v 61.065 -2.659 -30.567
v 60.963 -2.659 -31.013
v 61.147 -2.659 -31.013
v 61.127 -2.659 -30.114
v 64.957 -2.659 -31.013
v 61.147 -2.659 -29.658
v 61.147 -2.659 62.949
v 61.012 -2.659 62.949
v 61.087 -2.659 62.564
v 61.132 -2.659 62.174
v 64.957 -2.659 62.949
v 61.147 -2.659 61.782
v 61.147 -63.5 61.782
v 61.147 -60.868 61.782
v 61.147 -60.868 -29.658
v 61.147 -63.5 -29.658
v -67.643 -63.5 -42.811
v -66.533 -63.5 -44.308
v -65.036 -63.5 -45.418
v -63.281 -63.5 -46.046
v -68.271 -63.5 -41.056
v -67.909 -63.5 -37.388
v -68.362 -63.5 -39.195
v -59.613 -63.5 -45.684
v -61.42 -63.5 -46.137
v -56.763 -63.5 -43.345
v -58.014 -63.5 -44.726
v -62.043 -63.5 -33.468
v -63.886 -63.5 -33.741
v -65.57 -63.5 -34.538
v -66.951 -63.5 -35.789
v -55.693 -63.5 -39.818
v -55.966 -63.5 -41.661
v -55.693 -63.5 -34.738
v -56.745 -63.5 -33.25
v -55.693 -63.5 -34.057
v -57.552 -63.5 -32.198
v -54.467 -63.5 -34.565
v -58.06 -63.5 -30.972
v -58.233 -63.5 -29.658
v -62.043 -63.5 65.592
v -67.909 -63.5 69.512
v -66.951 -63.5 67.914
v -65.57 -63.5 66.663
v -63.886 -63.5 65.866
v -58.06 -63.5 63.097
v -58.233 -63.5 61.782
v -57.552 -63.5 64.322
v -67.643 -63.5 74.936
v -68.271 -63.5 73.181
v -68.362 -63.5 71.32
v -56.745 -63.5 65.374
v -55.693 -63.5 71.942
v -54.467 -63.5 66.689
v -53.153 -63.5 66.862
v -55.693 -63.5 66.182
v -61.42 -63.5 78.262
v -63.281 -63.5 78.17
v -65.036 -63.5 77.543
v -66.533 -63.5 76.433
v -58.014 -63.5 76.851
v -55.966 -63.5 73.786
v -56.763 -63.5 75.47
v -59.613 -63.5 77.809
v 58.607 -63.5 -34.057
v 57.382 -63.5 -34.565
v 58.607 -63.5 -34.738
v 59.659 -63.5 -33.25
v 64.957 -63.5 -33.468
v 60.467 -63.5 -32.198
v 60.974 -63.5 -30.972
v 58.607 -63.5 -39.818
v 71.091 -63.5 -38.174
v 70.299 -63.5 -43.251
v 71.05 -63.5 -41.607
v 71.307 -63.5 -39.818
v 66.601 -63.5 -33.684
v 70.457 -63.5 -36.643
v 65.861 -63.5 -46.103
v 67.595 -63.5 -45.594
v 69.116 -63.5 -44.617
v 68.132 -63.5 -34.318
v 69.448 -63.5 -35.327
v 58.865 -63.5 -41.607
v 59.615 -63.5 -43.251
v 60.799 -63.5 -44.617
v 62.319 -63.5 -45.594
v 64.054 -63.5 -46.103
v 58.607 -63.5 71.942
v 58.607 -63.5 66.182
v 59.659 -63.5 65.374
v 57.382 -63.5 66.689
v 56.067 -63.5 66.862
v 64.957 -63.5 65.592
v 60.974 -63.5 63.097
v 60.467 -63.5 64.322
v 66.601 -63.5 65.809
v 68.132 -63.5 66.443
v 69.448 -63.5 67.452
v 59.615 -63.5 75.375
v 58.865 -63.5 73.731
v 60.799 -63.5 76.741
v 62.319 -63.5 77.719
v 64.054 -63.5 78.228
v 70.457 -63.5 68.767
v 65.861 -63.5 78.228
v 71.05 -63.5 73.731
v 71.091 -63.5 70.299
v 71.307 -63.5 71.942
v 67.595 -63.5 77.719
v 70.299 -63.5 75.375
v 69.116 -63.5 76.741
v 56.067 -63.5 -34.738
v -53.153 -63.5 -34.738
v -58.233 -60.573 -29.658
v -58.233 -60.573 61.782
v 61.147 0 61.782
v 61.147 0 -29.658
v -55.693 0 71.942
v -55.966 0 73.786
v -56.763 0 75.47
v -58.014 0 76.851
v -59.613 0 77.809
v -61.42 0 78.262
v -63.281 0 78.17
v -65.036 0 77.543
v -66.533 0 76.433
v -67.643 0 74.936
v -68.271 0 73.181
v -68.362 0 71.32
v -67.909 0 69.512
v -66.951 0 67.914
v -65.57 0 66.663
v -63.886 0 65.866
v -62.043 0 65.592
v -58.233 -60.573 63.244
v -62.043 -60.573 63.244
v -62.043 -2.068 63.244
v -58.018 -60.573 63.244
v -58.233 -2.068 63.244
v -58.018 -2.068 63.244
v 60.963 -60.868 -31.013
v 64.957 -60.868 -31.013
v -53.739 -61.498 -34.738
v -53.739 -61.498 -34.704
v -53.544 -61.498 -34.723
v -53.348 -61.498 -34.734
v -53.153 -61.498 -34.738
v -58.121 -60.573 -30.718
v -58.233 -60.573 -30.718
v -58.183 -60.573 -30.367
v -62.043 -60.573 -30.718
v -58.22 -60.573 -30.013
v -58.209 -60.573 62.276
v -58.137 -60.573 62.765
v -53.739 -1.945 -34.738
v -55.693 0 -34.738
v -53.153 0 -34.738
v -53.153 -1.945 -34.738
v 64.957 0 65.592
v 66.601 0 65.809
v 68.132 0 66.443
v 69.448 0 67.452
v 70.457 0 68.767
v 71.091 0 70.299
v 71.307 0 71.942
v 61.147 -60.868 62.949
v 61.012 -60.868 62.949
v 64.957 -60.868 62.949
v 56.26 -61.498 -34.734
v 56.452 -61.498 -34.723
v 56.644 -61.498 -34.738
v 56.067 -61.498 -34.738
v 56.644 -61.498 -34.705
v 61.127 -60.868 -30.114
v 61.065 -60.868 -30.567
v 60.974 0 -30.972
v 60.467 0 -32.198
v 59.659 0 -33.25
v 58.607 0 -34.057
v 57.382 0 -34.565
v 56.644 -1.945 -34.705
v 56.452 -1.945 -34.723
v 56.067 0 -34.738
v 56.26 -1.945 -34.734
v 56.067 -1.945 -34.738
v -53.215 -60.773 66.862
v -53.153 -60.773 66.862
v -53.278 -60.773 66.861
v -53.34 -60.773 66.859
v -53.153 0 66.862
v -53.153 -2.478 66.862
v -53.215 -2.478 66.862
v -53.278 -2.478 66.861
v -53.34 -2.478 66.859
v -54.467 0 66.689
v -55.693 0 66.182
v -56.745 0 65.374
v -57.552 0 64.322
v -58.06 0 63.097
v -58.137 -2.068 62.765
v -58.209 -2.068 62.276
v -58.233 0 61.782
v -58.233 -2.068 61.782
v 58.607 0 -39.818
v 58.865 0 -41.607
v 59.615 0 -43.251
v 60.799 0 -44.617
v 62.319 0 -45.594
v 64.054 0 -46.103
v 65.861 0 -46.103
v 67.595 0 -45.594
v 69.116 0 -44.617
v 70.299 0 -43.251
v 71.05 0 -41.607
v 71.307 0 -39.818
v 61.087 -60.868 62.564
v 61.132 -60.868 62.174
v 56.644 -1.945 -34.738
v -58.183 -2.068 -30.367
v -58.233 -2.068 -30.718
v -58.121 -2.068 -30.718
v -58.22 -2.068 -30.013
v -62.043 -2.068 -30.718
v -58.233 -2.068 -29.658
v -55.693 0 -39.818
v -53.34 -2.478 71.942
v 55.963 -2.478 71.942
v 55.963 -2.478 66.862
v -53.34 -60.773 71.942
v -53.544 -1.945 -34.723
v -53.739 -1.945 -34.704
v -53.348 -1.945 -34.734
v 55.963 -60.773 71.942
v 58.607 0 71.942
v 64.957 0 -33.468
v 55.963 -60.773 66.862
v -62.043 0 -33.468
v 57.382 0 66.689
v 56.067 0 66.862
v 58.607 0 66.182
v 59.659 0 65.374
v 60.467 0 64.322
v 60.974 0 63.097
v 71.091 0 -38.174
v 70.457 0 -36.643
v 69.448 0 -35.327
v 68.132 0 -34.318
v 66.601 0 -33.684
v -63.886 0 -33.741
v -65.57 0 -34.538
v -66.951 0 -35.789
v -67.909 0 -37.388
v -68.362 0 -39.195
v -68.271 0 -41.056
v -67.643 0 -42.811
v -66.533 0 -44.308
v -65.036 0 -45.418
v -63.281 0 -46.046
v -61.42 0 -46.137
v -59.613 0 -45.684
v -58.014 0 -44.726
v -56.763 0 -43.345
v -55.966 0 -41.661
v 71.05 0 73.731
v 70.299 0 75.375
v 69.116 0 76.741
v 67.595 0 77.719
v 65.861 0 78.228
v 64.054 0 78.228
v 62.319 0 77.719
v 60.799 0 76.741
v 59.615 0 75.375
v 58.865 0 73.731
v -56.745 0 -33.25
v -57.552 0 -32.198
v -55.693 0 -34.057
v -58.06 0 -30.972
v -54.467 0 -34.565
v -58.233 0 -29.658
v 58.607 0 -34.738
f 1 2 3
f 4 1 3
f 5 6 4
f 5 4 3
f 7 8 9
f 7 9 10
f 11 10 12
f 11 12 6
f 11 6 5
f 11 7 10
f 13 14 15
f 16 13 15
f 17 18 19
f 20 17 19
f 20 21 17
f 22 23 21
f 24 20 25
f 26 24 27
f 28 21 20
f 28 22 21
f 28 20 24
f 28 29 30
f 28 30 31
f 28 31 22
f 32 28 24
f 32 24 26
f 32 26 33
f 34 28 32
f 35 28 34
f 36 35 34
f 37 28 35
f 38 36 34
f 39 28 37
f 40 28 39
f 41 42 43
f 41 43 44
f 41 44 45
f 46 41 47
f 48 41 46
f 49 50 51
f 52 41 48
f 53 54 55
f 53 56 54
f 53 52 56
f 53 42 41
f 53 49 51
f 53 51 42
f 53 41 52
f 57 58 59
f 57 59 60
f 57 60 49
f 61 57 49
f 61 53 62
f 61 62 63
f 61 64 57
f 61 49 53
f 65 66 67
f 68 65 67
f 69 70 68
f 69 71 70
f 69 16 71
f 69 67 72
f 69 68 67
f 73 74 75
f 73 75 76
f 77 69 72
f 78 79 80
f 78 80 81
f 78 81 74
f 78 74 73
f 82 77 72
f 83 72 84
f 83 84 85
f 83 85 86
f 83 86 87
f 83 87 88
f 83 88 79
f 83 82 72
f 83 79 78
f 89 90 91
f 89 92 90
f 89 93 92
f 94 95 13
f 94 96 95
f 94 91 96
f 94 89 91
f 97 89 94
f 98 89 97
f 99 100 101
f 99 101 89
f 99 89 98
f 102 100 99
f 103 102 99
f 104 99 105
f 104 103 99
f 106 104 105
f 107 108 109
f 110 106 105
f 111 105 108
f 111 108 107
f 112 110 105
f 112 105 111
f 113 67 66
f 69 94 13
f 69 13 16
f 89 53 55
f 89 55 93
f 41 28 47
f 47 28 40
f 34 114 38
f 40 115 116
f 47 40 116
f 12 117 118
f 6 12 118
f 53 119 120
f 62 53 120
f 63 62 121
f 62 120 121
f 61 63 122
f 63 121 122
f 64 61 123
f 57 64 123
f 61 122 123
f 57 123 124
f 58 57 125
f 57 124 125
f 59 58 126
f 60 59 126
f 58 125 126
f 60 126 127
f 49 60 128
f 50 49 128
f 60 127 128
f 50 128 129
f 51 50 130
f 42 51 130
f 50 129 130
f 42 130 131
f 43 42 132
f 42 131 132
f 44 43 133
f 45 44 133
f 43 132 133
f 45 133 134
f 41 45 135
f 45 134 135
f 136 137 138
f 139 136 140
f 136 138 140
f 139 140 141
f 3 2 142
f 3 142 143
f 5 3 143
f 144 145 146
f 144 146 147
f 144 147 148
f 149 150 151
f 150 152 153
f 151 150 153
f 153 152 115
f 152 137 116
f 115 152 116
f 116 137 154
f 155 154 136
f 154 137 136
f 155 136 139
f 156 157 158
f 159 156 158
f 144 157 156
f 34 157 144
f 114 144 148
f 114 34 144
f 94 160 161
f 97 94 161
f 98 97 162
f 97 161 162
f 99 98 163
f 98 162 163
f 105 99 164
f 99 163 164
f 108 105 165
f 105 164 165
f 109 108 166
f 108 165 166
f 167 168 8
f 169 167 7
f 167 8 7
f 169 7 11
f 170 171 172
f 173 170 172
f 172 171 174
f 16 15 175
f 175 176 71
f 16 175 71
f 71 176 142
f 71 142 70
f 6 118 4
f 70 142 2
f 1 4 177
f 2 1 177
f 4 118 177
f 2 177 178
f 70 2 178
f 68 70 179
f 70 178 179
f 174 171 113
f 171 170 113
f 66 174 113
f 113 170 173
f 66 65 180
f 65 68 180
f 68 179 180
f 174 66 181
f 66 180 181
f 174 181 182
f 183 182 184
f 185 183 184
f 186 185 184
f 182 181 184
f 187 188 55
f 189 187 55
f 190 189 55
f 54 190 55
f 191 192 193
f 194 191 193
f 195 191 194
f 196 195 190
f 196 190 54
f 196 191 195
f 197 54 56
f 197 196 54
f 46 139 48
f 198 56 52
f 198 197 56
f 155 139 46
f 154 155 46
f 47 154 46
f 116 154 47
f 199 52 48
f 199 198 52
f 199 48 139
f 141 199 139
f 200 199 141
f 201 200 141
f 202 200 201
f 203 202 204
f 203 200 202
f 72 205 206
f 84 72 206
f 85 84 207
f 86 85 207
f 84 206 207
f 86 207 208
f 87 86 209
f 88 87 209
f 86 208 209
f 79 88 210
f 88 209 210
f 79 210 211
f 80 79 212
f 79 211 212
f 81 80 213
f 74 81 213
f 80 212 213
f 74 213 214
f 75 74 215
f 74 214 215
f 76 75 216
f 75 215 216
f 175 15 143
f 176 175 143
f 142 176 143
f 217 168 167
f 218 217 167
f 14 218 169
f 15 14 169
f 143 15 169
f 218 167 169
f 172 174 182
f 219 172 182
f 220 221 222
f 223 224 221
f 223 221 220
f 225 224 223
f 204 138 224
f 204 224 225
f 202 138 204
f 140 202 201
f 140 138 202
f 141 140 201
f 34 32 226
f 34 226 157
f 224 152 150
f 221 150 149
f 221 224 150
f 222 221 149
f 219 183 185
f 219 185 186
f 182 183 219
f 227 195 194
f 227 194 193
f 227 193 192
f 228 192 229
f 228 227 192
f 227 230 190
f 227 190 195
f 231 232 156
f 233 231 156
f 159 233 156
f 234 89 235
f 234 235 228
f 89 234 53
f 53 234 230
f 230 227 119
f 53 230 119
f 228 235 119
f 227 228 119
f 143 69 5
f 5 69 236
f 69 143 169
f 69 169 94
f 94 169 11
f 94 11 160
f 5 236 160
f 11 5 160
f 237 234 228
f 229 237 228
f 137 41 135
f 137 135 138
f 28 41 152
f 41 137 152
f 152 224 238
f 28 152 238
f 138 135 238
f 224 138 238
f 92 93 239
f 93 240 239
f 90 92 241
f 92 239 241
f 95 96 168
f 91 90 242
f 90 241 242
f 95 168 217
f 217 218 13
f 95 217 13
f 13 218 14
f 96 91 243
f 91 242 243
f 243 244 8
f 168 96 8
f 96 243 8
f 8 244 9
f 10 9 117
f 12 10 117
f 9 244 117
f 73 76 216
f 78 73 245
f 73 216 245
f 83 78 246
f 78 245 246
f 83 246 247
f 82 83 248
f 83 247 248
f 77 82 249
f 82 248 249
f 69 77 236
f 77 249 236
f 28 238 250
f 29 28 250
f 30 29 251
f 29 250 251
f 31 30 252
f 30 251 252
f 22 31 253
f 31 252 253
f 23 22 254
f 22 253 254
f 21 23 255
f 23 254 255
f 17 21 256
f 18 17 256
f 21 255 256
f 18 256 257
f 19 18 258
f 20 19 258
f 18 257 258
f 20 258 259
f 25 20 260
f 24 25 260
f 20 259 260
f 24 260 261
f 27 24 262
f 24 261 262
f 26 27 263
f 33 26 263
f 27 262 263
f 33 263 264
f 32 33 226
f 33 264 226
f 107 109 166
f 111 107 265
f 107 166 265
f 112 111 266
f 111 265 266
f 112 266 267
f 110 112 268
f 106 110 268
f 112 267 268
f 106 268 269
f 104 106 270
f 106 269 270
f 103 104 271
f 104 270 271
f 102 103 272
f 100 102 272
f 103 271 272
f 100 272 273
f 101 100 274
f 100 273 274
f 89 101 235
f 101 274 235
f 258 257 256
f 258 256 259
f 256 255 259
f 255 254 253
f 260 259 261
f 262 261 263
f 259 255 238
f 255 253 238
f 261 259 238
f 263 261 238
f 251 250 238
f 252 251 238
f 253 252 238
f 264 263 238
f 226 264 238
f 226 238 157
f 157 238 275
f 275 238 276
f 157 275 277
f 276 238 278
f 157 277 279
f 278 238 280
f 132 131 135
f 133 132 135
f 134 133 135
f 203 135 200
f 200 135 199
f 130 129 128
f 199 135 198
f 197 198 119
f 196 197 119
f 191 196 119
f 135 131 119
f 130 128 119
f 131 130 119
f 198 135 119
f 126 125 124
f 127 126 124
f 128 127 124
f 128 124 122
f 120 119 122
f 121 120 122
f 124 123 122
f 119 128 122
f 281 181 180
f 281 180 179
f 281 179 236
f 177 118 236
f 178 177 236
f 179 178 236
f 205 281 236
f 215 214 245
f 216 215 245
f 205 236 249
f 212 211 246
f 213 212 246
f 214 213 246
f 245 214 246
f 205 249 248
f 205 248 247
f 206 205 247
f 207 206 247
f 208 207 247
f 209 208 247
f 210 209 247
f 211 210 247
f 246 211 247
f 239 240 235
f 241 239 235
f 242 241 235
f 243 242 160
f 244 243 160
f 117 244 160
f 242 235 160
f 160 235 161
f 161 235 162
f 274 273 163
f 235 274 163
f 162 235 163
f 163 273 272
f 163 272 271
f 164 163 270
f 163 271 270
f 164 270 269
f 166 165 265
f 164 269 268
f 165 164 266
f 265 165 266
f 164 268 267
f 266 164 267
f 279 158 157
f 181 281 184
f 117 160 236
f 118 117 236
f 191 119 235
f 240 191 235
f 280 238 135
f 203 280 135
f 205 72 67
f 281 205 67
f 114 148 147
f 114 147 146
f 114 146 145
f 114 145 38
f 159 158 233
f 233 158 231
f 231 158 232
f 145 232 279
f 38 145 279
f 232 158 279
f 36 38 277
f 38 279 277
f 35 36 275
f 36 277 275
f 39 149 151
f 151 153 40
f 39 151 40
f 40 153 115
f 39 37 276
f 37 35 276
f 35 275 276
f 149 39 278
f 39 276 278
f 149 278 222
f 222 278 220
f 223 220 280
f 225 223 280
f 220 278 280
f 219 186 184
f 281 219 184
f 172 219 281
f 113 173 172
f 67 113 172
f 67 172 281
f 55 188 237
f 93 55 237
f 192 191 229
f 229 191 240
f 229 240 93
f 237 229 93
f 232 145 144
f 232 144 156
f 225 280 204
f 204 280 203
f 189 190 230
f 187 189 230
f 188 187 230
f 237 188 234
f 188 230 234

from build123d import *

# Parameters (mm, degrees)
F1_DEPTH       = 63.5
F2_W           = 110.382810235
F2_H           = 59.5524079399
F3_DEPTH       = 25.4
F4_W           = 58.5044906475
F4_H           = 93.9617566764
F5_DEPTH       = 64.77
F6_W           = 109.3032732606
F6_H           = 58.2950827666
F7_DEPTH       = 52.832
F8_W           = 58.2090124954
F8_H           = 93.9617566764
F9_DEPTH       = 43.434
F10_T4_DEPTH   = 63.5
F10_T9_DEPTH   = 76.2
F10_T14_DEPTH  = 76.2
F10_T19_DEPTH  = 76.2
F10_T25_DEPTH  = 76.2
F10_T30_DEPTH  = 76.2
F10_T37_DEPTH  = 76.2
F10_T42_DEPTH  = 88.9
F10_T49_DEPTH  = 76.2
F10_T55_DEPTH  = 76.2
F10_T60_DEPTH  = 76.2
F10_T67_DEPTH  = 76.2
F10_T73_DEPTH  = 76.2
F10_T78_DEPTH  = 76.2
F10_T83_DEPTH  = 76.2
F10_T90_DEPTH  = 88.9
F10_T97_DEPTH  = 76.2
F10_T102_DEPTH = 88.9
F11_W          = 114.3
F11_H          = 5.08
F12_DEPTH      = 127.254


# Not quite as in the source:
# - a fillet or chamfer that OpenCascade refuses, or shapes differently, is made with other operations: its cross-section is extruded or revolved along the edge and cut away or added


with BuildPart() as f1:
    # F0 (on Front) → F1 (new body)
    with BuildSketch(Plane.XZ):
        with BuildLine():
            Line((-62.042625457, -33.4676207812), (-62.042625457, -39.8176207812))
            Line((-62.042625457, -39.8176207812), (-55.692625457, -39.8176207812))
            ThreePointArc((-55.692625457, -39.8176207812), (-56.3630127942, -36.9778144498), (-58.232625457, -34.7376207812))
            ThreePointArc((-58.232625457, -34.7376207812), (-60.0345791428, -33.7934818386), (-62.042625457, -33.4676207812))
        make_face()
        with BuildLine():
            Line((-55.692625457, -39.8176207812), (-62.042625457, -39.8176207812))
            Line((-62.042625457, -39.8176207812), (-62.042625457, -33.4676207812))
            ThreePointArc((-62.042625457, -33.4676207812), (-66.5327535176, -44.3077488417), (-55.692625457, -39.8176207812))
        make_face()
        with BuildLine():
            ThreePointArc((-58.232625457, -34.7376207812), (-56.3630127942, -36.9778144498), (-55.692625457, -39.8176207812))
            Line((-55.692625457, -39.8176207812), (58.607374543, -39.8176207812))
            ThreePointArc((58.607374543, -39.8176207812), (59.2777618801, -36.9778144498), (61.147374543, -34.7376207812))
            Line((61.147374543, -34.7376207812), (-58.232625457, -34.7376207812))
        make_face()
        with BuildLine():
            Line((-62.042625457, 65.5923792188), (-62.042625457, -33.4676207812))
            ThreePointArc((-62.042625457, -33.4676207812), (-60.0345791428, -33.7934818386), (-58.232625457, -34.7376207812))
            Line((-58.232625457, -34.7376207812), (-58.232625457, 66.8623792188))
            ThreePointArc((-58.232625457, 66.8623792188), (-60.0345791428, 65.9182402762), (-62.042625457, 65.5923792188))
        make_face()
        with BuildLine():
            ThreePointArc((61.147374543, -34.7376207812), (59.2777618801, -36.9778144498), (58.607374543, -39.8176207812))
            Line((58.607374543, -39.8176207812), (64.957374543, -39.8176207812))
            Line((64.957374543, -39.8176207812), (64.957374543, -33.4676207812))
            ThreePointArc((64.957374543, -33.4676207812), (62.9493282287, -33.7934818386), (61.147374543, -34.7376207812))
        make_face()
        with BuildLine():
            Line((64.957374543, -39.8176207812), (58.607374543, -39.8176207812))
            ThreePointArc((58.607374543, -39.8176207812), (64.957374543, -46.1676207812), (71.307374543, -39.8176207812))
            ThreePointArc((71.307374543, -39.8176207812), (69.4475026035, -35.3274927207), (64.957374543, -33.4676207812))
            Line((64.957374543, -33.4676207812), (64.957374543, -39.8176207812))
        make_face()
        with BuildLine():
            ThreePointArc((-55.692625457, 71.9423792188), (-66.5327535176, 76.4325072793), (-62.042625457, 65.5923792188))
            Line((-62.042625457, 65.5923792188), (-62.042625457, 71.9423792188))
            Line((-62.042625457, 71.9423792188), (-55.692625457, 71.9423792188))
        make_face()
        with BuildLine():
            Line((-62.042625457, 71.9423792188), (-62.042625457, 65.5923792188))
            ThreePointArc((-62.042625457, 65.5923792188), (-60.0345791428, 65.9182402762), (-58.232625457, 66.8623792188))
            ThreePointArc((-58.232625457, 66.8623792188), (-56.3630127942, 69.1025728874), (-55.692625457, 71.9423792188))
            Line((-55.692625457, 71.9423792188), (-62.042625457, 71.9423792188))
        make_face()
        with BuildLine():
            Line((61.147374543, 66.8623792188), (61.147374543, -34.7376207812))
            ThreePointArc((61.147374543, -34.7376207812), (62.9493282287, -33.7934818386), (64.957374543, -33.4676207812))
            Line((64.957374543, -33.4676207812), (64.957374543, 65.5923792188))
            ThreePointArc((64.957374543, 65.5923792188), (62.9493282287, 65.9182402762), (61.147374543, 66.8623792188))
        make_face()
        with BuildLine():
            ThreePointArc((-55.692625457, 71.9423792188), (-56.3630127942, 69.1025728874), (-58.232625457, 66.8623792188))
            Line((-58.232625457, 66.8623792188), (61.147374543, 66.8623792188))
            ThreePointArc((61.147374543, 66.8623792188), (59.2777618801, 69.1025728874), (58.607374543, 71.9423792188))
            Line((58.607374543, 71.9423792188), (-55.692625457, 71.9423792188))
        make_face()
        with BuildLine():
            ThreePointArc((58.607374543, 71.9423792188), (59.2777618801, 69.1025728874), (61.147374543, 66.8623792188))
            ThreePointArc((61.147374543, 66.8623792188), (62.9493282287, 65.9182402762), (64.957374543, 65.5923792188))
            Line((64.957374543, 65.5923792188), (64.957374543, 71.9423792188))
            Line((64.957374543, 71.9423792188), (58.607374543, 71.9423792188))
        make_face()
        with BuildLine():
            ThreePointArc((71.307374543, 71.9423792188), (64.957374543, 78.2923792188), (58.607374543, 71.9423792188))
            Line((58.607374543, 71.9423792188), (64.957374543, 71.9423792188))
            Line((64.957374543, 71.9423792188), (64.957374543, 65.5923792188))
            ThreePointArc((64.957374543, 65.5923792188), (69.4475026035, 67.4522511583), (71.307374543, 71.9423792188))
        make_face()
    extrude(amount=F1_DEPTH)

    # F2 (on face) → F3 (cut)
    with BuildSketch(Plane(origin=(0, 0, -39.8176207812), x_dir=(1, 0, 0), z_dir=(0, 0, -1))):
        with Locations((1.452460885, 31.7215439281)):
            Rectangle(F2_W, F2_H)
    extrude(amount=-F3_DEPTH, mode=Mode.SUBTRACT)

    # F4 (on face) → F5 (cut)
    with BuildSketch(Plane(origin=(-62.042625457, 0, 0), x_dir=(0, -1, 0), z_dir=(-1, 0, 0))):
        with Locations((31.3205874991, 16.2632633001)):
            Rectangle(F4_W, F4_H)
    extrude(amount=-F5_DEPTH, mode=Mode.SUBTRACT)

    # F6 (on face) → F7 (cut)
    with BuildSketch(Plane.XY.offset(71.9423792188)):
        with Locations((1.3116374612, -31.6250824835)):
            Rectangle(F6_W, F6_H)
    extrude(amount=-F7_DEPTH, mode=Mode.SUBTRACT)

    # F8 (on face) → F9 (cut)
    with BuildSketch(Plane.YZ.offset(64.957374543)):
        with Locations((-31.7638017004, 15.9677881747)):
            Rectangle(F8_W, F8_H)
    extrude(amount=-F9_DEPTH, mode=Mode.SUBTRACT)

    # F10: fillet of radius 5.08 on 4 edges, made by hand


with BuildPart() as f10_tool2:
    # F10_s3 → F10_t4 (new body)
    with BuildSketch(Plane.XZ):
        with BuildLine():
            ThreePointArc((56.067374543, 66.8623792188), (59.6594769914, 65.3744816672), (61.147374543, 61.7823792188))
            Line((61.147374543, 61.7823792188), (61.147374543, 66.8623792188))
            Line((61.147374543, 66.8623792188), (56.067374543, 66.8623792188))
        make_face()
    extrude(amount=F10_T4_DEPTH)

    split(bisect_by=Plane.XY.offset(62.948666513), keep=Keep.TOP)


with BuildPart() as f1_1:
    add(f1.part)

    # F10_t1: union F10_tool2
    add(f10_tool2.part)


with BuildPart() as f10_tool7:
    # F10_s8 → F10_t9 (new body)
    with BuildSketch(Plane.XZ):
        with BuildLine():
            ThreePointArc((56.067374543, 66.8623792188), (59.6594769914, 65.3744816672), (61.147374543, 61.7823792188))
            Line((61.147374543, 61.7823792188), (61.147374543, 66.8623792188))
            Line((61.147374543, 66.8623792188), (56.067374543, 66.8623792188))
        make_face()
    extrude(amount=F10_T9_DEPTH)

    split(bisect_by=Plane.XZ.offset(2.6592954528), keep=Keep.BOTTOM)


with BuildPart() as f1_2:
    add(f1_1.part)

    # F10_t6: union F10_tool7
    add(f10_tool7.part)


with BuildPart() as f10_tool12:
    # F10_s13 → F10_t14 (new body)
    with BuildSketch(Plane.XZ.offset(-12.7)):
        with BuildLine():
            ThreePointArc((56.067374543, 66.8623792188), (59.6594769914, 65.3744816672), (61.147374543, 61.7823792188))
            Line((61.147374543, 61.7823792188), (61.147374543, 66.8623792188))
            Line((61.147374543, 66.8623792188), (56.067374543, 66.8623792188))
        make_face()
    extrude(amount=F10_T14_DEPTH)

    split(bisect_by=Plane.XZ.offset(60.8683079481), keep=Keep.TOP)


with BuildPart() as f1_3:
    add(f1_2.part)

    # F10_t11: union F10_tool12
    add(f10_tool12.part)


with BuildPart() as f10_tool17:
    # F10_s18 → F10_t19 (new body)
    with BuildSketch(Plane.XZ):
        with BuildLine():
            ThreePointArc((-53.152625457, 66.8623792188), (-56.7447279055, 65.3744816672), (-58.232625457, 61.7823792188))
            Line((-58.232625457, 61.7823792188), (-58.232625457, 66.8623792188))
            Line((-58.232625457, 66.8623792188), (-53.152625457, 66.8623792188))
        make_face()
    extrude(amount=F10_T19_DEPTH)

    split(bisect_by=Plane.XZ.offset(2.4775411002), keep=Keep.BOTTOM)

    split(bisect_by=Plane.XY.offset(63.2441416383), keep=Keep.TOP)


with BuildPart() as f1_4:
    add(f1_3.part)

    # F10_t16: union F10_tool17
    add(f10_tool17.part)


with BuildPart() as f10_tool23:
    # F10_s24 → F10_t25 (new body)
    with BuildSketch(Plane.XZ):
        with BuildLine():
            ThreePointArc((-53.152625457, 66.8623792188), (-56.7447279055, 65.3744816672), (-58.232625457, 61.7823792188))
            Line((-58.232625457, 61.7823792188), (-58.232625457, 66.8623792188))
            Line((-58.232625457, 66.8623792188), (-53.152625457, 66.8623792188))
        make_face()
    extrude(amount=F10_T25_DEPTH)

    split(bisect_by=Plane.XZ.offset(2.0683421753), keep=Keep.BOTTOM)


with BuildPart() as f1_5:
    add(f1_4.part)

    # F10_t22: union F10_tool23
    add(f10_tool23.part)


with BuildPart() as f10_tool28:
    # F10_s29 → F10_t30 (new body)
    with BuildSketch(Plane.XZ.offset(-12.7)):
        with BuildLine():
            ThreePointArc((-53.152625457, 66.8623792188), (-56.7447279055, 65.3744816672), (-58.232625457, 61.7823792188))
            Line((-58.232625457, 61.7823792188), (-58.232625457, 66.8623792188))
            Line((-58.232625457, 66.8623792188), (-53.152625457, 66.8623792188))
        make_face()
    extrude(amount=F10_T30_DEPTH)

    split(bisect_by=Plane.YZ.offset(-53.3399991691), keep=Keep.BOTTOM)

    split(bisect_by=Plane.XZ.offset(2.0683421753), keep=Keep.TOP)

    split(bisect_by=Plane.XY.offset(63.2441416383), keep=Keep.TOP)


with BuildPart() as f1_6:
    add(f1_5.part)

    # F10_t27: union F10_tool28
    add(f10_tool28.part)


with BuildPart() as f10_tool35:
    # F10_s36 → F10_t37 (new body)
    with BuildSketch(Plane.XZ.offset(-12.7)):
        with BuildLine():
            ThreePointArc((-53.152625457, 66.8623792188), (-56.7447279055, 65.3744816672), (-58.232625457, 61.7823792188))
            Line((-58.232625457, 61.7823792188), (-58.232625457, 66.8623792188))
            Line((-58.232625457, 66.8623792188), (-53.152625457, 66.8623792188))
        make_face()
    extrude(amount=F10_T37_DEPTH)

    split(bisect_by=Plane.XZ.offset(60.7726238668), keep=Keep.TOP)


with BuildPart() as f1_7:
    add(f1_6.part)

    # F10_t34: union F10_tool35
    add(f10_tool35.part)


with BuildPart() as f10_tool40:
    # F10_s41 → F10_t42 (new body)
    with BuildSketch(Plane.XZ.offset(-12.7)):
        with BuildLine():
            ThreePointArc((-53.152625457, 66.8623792188), (-56.7447279055, 65.3744816672), (-58.232625457, 61.7823792188))
            Line((-58.232625457, 61.7823792188), (-58.232625457, 66.8623792188))
            Line((-58.232625457, 66.8623792188), (-53.152625457, 66.8623792188))
        make_face()
    extrude(amount=F10_T42_DEPTH)

    split(bisect_by=Plane.XZ.offset(60.7726238668), keep=Keep.BOTTOM)

    split(bisect_by=Plane.XZ.offset(60.5728328228), keep=Keep.TOP)

    split(bisect_by=Plane.XY.offset(63.2441416383), keep=Keep.BOTTOM)


with BuildPart() as f1_8:
    add(f1_7.part)

    # F10_t39: union F10_tool40
    add(f10_tool40.part)


with BuildPart() as f10_tool47:
    # F10_s48 → F10_t49 (new body)
    with BuildSketch(Plane.XZ):
        with BuildLine():
            ThreePointArc((61.147374543, -29.6576207812), (59.6594769914, -33.2497232296), (56.067374543, -34.7376207812))
            Line((56.067374543, -34.7376207812), (61.147374543, -34.7376207812))
            Line((61.147374543, -34.7376207812), (61.147374543, -29.6576207812))
        make_face()
    extrude(amount=F10_T49_DEPTH)

    split(bisect_by=Plane.XZ.offset(2.6592954528), keep=Keep.BOTTOM)

    split(bisect_by=Plane.YZ.offset(56.6438660026), keep=Keep.TOP)


with BuildPart() as f1_9:
    add(f1_8.part)

    # F10_t46: union F10_tool47
    add(f10_tool47.part)


with BuildPart() as f10_tool53:
    # F10_s54 → F10_t55 (new body)
    with BuildSketch(Plane.XZ):
        with BuildLine():
            ThreePointArc((61.147374543, -29.6576207812), (59.6594769914, -33.2497232296), (56.067374543, -34.7376207812))
            Line((56.067374543, -34.7376207812), (61.147374543, -34.7376207812))
            Line((61.147374543, -34.7376207812), (61.147374543, -29.6576207812))
        make_face()
    extrude(amount=F10_T55_DEPTH)

    split(bisect_by=Plane.XZ.offset(1.9453399582), keep=Keep.BOTTOM)


with BuildPart() as f1_10:
    add(f1_9.part)

    # F10_t52: union F10_tool53
    add(f10_tool53.part)


with BuildPart() as f10_tool58:
    # F10_s59 → F10_t60 (new body)
    with BuildSketch(Plane.XZ.offset(-12.7)):
        with BuildLine():
            ThreePointArc((61.147374543, -29.6576207812), (59.6594769914, -33.2497232296), (56.067374543, -34.7376207812))
            Line((56.067374543, -34.7376207812), (61.147374543, -34.7376207812))
            Line((61.147374543, -34.7376207812), (61.147374543, -29.6576207812))
        make_face()
    extrude(amount=F10_T60_DEPTH)

    split(bisect_by=Plane.XY.offset(-31.0130901635), keep=Keep.BOTTOM)

    split(bisect_by=Plane.YZ.offset(56.6438660026), keep=Keep.TOP)

    split(bisect_by=Plane.XZ.offset(1.9453399582), keep=Keep.TOP)


with BuildPart() as f1_11:
    add(f1_10.part)

    # F10_t57: union F10_tool58
    add(f10_tool58.part)


with BuildPart() as f10_tool65:
    # F10_s66 → F10_t67 (new body)
    with BuildSketch(Plane.XZ.offset(-12.7)):
        with BuildLine():
            ThreePointArc((61.147374543, -29.6576207812), (59.6594769914, -33.2497232296), (56.067374543, -34.7376207812))
            Line((56.067374543, -34.7376207812), (61.147374543, -34.7376207812))
            Line((61.147374543, -34.7376207812), (61.147374543, -29.6576207812))
        make_face()
    extrude(amount=F10_T67_DEPTH)

    split(bisect_by=Plane.XZ.offset(60.8683079481), keep=Keep.TOP)

    split(bisect_by=Plane.YZ.offset(56.6438660026), keep=Keep.TOP)


with BuildPart() as f1_12:
    add(f1_11.part)

    # F10_t64: union F10_tool65
    add(f10_tool65.part)


with BuildPart() as f10_tool71:
    # F10_s72 → F10_t73 (new body)
    with BuildSketch(Plane.XZ.offset(-12.7)):
        with BuildLine():
            ThreePointArc((61.147374543, -29.6576207812), (59.6594769914, -33.2497232296), (56.067374543, -34.7376207812))
            Line((56.067374543, -34.7376207812), (61.147374543, -34.7376207812))
            Line((61.147374543, -34.7376207812), (61.147374543, -29.6576207812))
        make_face()
    extrude(amount=F10_T73_DEPTH)

    split(bisect_by=Plane.XZ.offset(61.4977478981), keep=Keep.TOP)


with BuildPart() as f1_13:
    add(f1_12.part)

    # F10_t70: union F10_tool71
    add(f10_tool71.part)


with BuildPart() as f10_tool76:
    # F10_s77 → F10_t78 (new body)
    with BuildSketch(Plane.XZ):
        with BuildLine():
            ThreePointArc((-53.152625457, -34.7376207812), (-56.7447279055, -33.2497232296), (-58.232625457, -29.6576207812))
            Line((-58.232625457, -29.6576207812), (-58.232625457, -34.7376207812))
            Line((-58.232625457, -34.7376207812), (-53.152625457, -34.7376207812))
        make_face()
    extrude(amount=F10_T78_DEPTH)

    split(bisect_by=Plane.XZ.offset(1.9453399582), keep=Keep.BOTTOM)


with BuildPart() as f1_14:
    add(f1_13.part)

    # F10_t75: union F10_tool76
    add(f10_tool76.part)


with BuildPart() as f10_tool81:
    # F10_s82 → F10_t83 (new body)
    with BuildSketch(Plane.XZ.offset(-12.7)):
        with BuildLine():
            ThreePointArc((-53.152625457, -34.7376207812), (-56.7447279055, -33.2497232296), (-58.232625457, -29.6576207812))
            Line((-58.232625457, -29.6576207812), (-58.232625457, -34.7376207812))
            Line((-58.232625457, -34.7376207812), (-53.152625457, -34.7376207812))
        make_face()
    extrude(amount=F10_T83_DEPTH)

    split(bisect_by=Plane.XZ.offset(1.9453399582), keep=Keep.TOP)

    split(bisect_by=Plane.YZ.offset(-53.7389442325), keep=Keep.BOTTOM)

    split(bisect_by=Plane.XY.offset(-30.7176150382), keep=Keep.BOTTOM)


with BuildPart() as f1_15:
    add(f1_14.part)

    # F10_t80: union F10_tool81
    add(f10_tool81.part)


with BuildPart() as f10_tool88:
    # F10_s89 → F10_t90 (new body)
    with BuildSketch(Plane.XZ.offset(-12.7)):
        with BuildLine():
            ThreePointArc((-53.152625457, -34.7376207812), (-56.7447279055, -33.2497232296), (-58.232625457, -29.6576207812))
            Line((-58.232625457, -29.6576207812), (-58.232625457, -34.7376207812))
            Line((-58.232625457, -34.7376207812), (-53.152625457, -34.7376207812))
        make_face()
    extrude(amount=F10_T90_DEPTH)

    split(bisect_by=Plane.XZ.offset(1.9453399582), keep=Keep.TOP)

    split(bisect_by=Plane.XY.offset(-30.7176150382), keep=Keep.TOP)

    split(bisect_by=Plane.XZ.offset(2.0683421753), keep=Keep.BOTTOM)


with BuildPart() as f1_16:
    add(f1_15.part)

    # F10_t87: union F10_tool88
    add(f10_tool88.part)


with BuildPart() as f10_tool95:
    # F10_s96 → F10_t97 (new body)
    with BuildSketch(Plane.XZ.offset(-12.7)):
        with BuildLine():
            ThreePointArc((-53.152625457, -34.7376207812), (-56.7447279055, -33.2497232296), (-58.232625457, -29.6576207812))
            Line((-58.232625457, -29.6576207812), (-58.232625457, -34.7376207812))
            Line((-58.232625457, -34.7376207812), (-53.152625457, -34.7376207812))
        make_face()
    extrude(amount=F10_T97_DEPTH)

    split(bisect_by=Plane.XZ.offset(61.4977478981), keep=Keep.TOP)


with BuildPart() as f1_17:
    add(f1_16.part)

    # F10_t94: union F10_tool95
    add(f10_tool95.part)


with BuildPart() as f10_tool100:
    # F10_s101 → F10_t102 (new body)
    with BuildSketch(Plane.XZ.offset(-12.7)):
        with BuildLine():
            ThreePointArc((-53.152625457, -34.7376207812), (-56.7447279055, -33.2497232296), (-58.232625457, -29.6576207812))
            Line((-58.232625457, -29.6576207812), (-58.232625457, -34.7376207812))
            Line((-58.232625457, -34.7376207812), (-53.152625457, -34.7376207812))
        make_face()
    extrude(amount=F10_T102_DEPTH)

    split(bisect_by=Plane.XZ.offset(61.4977478981), keep=Keep.BOTTOM)

    split(bisect_by=Plane.XZ.offset(60.5728328228), keep=Keep.TOP)

    split(bisect_by=Plane.XY.offset(-30.7176150382), keep=Keep.TOP)


with BuildPart() as f1_18:
    add(f1_17.part)

    # F10_t99: union F10_tool100
    add(f10_tool100.part)

    # F11 (on face) → F12 (cut)
    with BuildSketch(Plane.XZ.offset(63.5)):
        with Locations((1.457374543, -37.2776207812)):
            Rectangle(F11_W, F11_H)
    extrude(amount=-F12_DEPTH, mode=Mode.SUBTRACT)


solid = f1_18.part
